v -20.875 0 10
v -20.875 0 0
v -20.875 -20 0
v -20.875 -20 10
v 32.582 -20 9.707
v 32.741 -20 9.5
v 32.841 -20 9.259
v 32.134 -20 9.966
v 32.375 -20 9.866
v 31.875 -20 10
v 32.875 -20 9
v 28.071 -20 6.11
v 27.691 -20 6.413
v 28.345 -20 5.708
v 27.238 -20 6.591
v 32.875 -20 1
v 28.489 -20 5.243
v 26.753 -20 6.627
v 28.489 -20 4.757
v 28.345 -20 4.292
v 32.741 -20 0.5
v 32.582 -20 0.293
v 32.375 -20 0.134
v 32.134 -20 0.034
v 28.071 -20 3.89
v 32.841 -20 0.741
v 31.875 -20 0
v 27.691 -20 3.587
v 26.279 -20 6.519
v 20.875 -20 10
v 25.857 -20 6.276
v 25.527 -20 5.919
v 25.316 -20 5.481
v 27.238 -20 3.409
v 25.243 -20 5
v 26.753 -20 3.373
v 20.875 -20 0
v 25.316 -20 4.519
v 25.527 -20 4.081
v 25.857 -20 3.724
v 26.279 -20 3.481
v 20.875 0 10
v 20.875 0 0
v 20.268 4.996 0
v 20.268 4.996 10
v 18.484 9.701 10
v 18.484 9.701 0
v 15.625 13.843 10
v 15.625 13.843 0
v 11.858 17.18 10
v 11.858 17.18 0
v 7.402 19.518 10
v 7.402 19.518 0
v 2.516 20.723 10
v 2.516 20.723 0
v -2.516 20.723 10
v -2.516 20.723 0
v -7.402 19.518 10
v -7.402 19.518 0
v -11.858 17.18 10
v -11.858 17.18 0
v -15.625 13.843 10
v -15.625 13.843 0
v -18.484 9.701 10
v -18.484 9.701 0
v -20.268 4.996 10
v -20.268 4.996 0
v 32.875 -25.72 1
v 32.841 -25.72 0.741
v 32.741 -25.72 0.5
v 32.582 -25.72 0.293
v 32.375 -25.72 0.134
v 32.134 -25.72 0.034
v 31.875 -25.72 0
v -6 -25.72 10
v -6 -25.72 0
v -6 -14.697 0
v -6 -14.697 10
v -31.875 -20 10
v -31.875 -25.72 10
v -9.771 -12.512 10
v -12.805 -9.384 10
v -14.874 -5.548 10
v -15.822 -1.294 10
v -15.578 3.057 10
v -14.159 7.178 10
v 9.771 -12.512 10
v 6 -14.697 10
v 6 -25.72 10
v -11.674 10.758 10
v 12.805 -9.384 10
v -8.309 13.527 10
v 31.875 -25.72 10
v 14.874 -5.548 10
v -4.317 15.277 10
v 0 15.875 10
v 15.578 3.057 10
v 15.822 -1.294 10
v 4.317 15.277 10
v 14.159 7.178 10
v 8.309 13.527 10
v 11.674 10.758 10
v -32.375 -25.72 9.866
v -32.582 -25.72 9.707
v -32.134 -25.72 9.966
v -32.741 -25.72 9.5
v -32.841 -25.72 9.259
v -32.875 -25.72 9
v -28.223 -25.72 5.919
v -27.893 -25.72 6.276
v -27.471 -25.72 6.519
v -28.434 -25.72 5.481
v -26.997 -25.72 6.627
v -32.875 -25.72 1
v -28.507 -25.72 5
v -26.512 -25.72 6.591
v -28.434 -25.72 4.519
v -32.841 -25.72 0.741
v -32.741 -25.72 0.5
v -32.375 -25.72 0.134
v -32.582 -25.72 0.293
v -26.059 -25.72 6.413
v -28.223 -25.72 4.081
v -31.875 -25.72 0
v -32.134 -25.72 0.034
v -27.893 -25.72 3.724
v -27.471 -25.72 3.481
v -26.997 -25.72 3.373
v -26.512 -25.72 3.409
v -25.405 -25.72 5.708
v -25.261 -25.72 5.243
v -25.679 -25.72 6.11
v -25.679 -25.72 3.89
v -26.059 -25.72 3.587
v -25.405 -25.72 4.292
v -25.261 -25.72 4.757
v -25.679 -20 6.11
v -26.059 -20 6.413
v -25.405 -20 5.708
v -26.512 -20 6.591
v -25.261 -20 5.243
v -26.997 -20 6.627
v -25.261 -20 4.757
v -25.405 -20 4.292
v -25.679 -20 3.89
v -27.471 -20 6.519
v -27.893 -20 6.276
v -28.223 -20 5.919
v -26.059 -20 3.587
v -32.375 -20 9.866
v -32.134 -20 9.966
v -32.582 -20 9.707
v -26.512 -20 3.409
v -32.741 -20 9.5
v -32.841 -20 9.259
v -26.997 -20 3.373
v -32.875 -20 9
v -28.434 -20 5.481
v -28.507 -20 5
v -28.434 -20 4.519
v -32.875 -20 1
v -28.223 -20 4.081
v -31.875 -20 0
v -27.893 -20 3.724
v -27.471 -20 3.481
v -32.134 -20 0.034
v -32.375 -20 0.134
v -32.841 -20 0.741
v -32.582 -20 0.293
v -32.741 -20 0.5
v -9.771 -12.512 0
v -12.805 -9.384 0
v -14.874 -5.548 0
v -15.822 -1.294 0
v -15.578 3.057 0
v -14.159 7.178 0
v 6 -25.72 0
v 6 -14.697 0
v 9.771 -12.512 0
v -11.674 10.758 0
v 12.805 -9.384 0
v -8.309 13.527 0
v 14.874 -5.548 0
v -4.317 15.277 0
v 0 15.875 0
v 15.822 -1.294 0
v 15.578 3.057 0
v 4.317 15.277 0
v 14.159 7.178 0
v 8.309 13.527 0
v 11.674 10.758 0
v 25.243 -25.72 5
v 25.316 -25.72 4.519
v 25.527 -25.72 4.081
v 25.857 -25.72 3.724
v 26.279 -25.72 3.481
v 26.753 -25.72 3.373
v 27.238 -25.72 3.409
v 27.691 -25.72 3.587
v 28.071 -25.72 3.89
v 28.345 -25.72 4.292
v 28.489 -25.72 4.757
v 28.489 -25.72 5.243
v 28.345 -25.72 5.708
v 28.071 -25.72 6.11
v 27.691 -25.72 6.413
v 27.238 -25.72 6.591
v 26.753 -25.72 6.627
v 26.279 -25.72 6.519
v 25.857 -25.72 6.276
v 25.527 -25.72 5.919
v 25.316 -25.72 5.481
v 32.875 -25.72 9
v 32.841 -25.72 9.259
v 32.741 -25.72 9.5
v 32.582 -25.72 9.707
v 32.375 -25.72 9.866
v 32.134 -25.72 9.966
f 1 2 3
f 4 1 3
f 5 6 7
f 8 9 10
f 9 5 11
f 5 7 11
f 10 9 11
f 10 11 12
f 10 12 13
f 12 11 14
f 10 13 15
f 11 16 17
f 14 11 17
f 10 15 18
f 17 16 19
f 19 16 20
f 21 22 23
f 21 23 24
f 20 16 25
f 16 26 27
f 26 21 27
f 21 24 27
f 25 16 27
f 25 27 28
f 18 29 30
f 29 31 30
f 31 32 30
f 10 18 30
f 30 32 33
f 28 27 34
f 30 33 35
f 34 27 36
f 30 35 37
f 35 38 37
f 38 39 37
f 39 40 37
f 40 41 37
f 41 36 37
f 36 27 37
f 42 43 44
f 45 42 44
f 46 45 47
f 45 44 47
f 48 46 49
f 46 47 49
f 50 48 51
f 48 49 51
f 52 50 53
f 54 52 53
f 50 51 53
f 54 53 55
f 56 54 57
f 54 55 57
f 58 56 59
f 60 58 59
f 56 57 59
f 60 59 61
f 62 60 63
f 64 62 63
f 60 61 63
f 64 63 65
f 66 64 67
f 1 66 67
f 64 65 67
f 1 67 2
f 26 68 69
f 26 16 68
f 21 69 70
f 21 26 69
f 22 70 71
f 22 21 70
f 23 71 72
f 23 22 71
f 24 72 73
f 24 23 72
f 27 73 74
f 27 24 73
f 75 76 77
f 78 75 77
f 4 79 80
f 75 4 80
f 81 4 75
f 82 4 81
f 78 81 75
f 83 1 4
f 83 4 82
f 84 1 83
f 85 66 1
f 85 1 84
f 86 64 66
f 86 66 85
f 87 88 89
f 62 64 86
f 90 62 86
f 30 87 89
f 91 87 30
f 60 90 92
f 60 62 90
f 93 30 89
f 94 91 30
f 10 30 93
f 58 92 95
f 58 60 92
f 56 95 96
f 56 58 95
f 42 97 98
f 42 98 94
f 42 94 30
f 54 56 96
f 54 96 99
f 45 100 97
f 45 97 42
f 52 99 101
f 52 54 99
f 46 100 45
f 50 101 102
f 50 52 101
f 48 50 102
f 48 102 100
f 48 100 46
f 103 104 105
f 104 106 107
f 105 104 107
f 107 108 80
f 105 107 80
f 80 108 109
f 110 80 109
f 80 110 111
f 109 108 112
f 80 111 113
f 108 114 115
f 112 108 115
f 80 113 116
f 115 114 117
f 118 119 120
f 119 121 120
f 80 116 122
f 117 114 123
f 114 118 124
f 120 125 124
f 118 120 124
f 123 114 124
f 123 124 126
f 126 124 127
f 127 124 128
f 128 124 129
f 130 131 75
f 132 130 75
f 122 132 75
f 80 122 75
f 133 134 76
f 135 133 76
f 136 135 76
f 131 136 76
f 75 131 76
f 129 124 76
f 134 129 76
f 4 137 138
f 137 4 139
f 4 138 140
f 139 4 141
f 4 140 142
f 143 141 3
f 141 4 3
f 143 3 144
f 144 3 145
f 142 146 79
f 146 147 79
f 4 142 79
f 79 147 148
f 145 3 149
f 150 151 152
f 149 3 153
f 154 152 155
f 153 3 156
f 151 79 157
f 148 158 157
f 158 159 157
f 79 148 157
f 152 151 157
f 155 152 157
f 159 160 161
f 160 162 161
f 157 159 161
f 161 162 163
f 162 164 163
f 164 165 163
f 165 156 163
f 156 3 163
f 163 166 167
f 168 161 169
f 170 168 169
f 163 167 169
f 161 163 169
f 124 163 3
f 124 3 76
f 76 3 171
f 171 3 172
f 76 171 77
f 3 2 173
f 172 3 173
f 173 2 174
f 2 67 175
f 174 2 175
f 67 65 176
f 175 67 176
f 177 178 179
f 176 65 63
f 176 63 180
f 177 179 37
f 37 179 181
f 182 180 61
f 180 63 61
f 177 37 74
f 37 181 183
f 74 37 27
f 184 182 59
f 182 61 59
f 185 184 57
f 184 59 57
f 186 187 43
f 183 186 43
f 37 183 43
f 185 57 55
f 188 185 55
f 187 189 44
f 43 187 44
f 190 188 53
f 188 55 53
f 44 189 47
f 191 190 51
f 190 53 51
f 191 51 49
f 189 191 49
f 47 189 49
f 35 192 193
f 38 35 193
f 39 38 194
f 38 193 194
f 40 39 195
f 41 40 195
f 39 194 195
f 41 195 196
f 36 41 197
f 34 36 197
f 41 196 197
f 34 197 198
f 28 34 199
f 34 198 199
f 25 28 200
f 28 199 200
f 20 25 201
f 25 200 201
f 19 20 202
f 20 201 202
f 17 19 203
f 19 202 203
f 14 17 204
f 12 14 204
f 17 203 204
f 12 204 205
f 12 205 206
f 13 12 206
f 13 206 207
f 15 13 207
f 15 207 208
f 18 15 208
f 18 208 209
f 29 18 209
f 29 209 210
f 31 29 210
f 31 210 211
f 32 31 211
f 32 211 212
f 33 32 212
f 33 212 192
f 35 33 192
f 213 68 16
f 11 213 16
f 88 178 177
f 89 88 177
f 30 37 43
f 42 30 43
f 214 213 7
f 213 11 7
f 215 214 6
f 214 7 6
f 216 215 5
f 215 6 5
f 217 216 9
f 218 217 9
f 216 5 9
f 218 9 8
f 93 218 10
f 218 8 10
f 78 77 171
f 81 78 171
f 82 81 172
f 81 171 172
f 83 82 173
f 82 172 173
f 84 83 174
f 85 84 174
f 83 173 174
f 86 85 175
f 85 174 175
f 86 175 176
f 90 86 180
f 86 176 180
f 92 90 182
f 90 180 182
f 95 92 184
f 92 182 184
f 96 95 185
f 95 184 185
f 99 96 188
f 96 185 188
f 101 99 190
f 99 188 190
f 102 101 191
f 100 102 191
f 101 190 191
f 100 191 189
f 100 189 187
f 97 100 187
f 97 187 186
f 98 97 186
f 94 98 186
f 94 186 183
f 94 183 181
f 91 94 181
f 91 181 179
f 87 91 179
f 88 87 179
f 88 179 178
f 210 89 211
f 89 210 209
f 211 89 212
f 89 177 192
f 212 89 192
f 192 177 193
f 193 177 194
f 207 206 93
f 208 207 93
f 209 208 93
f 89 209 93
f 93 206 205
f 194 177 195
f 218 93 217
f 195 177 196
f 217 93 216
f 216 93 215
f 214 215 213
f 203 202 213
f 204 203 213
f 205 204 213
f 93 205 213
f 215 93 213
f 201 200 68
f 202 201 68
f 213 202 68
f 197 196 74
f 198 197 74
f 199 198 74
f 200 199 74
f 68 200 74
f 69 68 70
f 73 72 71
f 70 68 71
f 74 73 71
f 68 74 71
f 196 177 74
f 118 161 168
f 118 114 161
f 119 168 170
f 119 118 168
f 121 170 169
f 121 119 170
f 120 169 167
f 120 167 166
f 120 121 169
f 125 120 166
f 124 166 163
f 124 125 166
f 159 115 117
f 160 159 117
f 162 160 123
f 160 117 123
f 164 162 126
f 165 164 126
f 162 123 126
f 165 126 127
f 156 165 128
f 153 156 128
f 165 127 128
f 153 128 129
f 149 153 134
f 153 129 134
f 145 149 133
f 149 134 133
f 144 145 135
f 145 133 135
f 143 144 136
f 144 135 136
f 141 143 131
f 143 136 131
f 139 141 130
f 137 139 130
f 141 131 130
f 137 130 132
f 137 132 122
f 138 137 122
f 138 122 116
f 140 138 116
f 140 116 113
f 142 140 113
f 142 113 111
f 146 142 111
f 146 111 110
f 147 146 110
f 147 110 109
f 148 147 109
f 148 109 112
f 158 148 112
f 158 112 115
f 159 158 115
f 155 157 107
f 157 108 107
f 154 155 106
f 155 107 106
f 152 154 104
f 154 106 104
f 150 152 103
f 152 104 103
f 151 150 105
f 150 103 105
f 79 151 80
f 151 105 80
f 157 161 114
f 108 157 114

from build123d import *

# Parameters (mm, degrees)
BOSS_EXTRUDE1_DEPTH   = 10
FILLET1_R             = 1
F_4_CLEARANCE_HOLE1_D = 3.2639


with BuildPart() as part:
    # Sketch1 → Boss-Extrude1 (new body)
    with BuildSketch(Plane.XY):
        with BuildLine():
            Line((-20.875, 0), (-20.875, -20))
            Line((-20.875, -20), (-32.875, -20))
            Line((-32.875, -20), (-32.875, -25.72))
            Line((-32.875, -25.72), (-6, -25.72))
            Line((-6, -25.72), (-6, -14.69747002))
            ThreePointArc((-6, -14.69747002), (0, 15.875), (6, -14.69747002))
            Line((6, -14.69747002), (6, -25.72))
            Line((6, -25.72), (32.875, -25.72))
            Line((32.875, -25.72), (32.875, -20))
            Line((32.875, -20), (20.875, -20))
            Line((20.875, -20), (20.875, 0))
            ThreePointArc((20.875, 0), (0, 20.875), (-20.875, 0))
        make_face()
    extrude(amount=BOSS_EXTRUDE1_DEPTH)

    # Fillet1
    fillet1_edges = [part.edges().sort_by_distance(p)[0] for p in [
        (-32.875, -22.86, 0),
        (32.875, -22.86, 0),
        (32.875, -22.86, 10),
        (-32.875, -22.86, 10),
    ]]
    fillet(fillet1_edges, radius=FILLET1_R)

    # #4 Clearance Hole1 (through all)
    with Locations(Plane(origin=(0, -20, 0), x_dir=(1, 0, 0), z_dir=(0, 1, 0))):
        with Locations((-26.875, -5), (26.875, -5)):
            Hole(F_4_CLEARANCE_HOLE1_D / 2)


solid = part.part
